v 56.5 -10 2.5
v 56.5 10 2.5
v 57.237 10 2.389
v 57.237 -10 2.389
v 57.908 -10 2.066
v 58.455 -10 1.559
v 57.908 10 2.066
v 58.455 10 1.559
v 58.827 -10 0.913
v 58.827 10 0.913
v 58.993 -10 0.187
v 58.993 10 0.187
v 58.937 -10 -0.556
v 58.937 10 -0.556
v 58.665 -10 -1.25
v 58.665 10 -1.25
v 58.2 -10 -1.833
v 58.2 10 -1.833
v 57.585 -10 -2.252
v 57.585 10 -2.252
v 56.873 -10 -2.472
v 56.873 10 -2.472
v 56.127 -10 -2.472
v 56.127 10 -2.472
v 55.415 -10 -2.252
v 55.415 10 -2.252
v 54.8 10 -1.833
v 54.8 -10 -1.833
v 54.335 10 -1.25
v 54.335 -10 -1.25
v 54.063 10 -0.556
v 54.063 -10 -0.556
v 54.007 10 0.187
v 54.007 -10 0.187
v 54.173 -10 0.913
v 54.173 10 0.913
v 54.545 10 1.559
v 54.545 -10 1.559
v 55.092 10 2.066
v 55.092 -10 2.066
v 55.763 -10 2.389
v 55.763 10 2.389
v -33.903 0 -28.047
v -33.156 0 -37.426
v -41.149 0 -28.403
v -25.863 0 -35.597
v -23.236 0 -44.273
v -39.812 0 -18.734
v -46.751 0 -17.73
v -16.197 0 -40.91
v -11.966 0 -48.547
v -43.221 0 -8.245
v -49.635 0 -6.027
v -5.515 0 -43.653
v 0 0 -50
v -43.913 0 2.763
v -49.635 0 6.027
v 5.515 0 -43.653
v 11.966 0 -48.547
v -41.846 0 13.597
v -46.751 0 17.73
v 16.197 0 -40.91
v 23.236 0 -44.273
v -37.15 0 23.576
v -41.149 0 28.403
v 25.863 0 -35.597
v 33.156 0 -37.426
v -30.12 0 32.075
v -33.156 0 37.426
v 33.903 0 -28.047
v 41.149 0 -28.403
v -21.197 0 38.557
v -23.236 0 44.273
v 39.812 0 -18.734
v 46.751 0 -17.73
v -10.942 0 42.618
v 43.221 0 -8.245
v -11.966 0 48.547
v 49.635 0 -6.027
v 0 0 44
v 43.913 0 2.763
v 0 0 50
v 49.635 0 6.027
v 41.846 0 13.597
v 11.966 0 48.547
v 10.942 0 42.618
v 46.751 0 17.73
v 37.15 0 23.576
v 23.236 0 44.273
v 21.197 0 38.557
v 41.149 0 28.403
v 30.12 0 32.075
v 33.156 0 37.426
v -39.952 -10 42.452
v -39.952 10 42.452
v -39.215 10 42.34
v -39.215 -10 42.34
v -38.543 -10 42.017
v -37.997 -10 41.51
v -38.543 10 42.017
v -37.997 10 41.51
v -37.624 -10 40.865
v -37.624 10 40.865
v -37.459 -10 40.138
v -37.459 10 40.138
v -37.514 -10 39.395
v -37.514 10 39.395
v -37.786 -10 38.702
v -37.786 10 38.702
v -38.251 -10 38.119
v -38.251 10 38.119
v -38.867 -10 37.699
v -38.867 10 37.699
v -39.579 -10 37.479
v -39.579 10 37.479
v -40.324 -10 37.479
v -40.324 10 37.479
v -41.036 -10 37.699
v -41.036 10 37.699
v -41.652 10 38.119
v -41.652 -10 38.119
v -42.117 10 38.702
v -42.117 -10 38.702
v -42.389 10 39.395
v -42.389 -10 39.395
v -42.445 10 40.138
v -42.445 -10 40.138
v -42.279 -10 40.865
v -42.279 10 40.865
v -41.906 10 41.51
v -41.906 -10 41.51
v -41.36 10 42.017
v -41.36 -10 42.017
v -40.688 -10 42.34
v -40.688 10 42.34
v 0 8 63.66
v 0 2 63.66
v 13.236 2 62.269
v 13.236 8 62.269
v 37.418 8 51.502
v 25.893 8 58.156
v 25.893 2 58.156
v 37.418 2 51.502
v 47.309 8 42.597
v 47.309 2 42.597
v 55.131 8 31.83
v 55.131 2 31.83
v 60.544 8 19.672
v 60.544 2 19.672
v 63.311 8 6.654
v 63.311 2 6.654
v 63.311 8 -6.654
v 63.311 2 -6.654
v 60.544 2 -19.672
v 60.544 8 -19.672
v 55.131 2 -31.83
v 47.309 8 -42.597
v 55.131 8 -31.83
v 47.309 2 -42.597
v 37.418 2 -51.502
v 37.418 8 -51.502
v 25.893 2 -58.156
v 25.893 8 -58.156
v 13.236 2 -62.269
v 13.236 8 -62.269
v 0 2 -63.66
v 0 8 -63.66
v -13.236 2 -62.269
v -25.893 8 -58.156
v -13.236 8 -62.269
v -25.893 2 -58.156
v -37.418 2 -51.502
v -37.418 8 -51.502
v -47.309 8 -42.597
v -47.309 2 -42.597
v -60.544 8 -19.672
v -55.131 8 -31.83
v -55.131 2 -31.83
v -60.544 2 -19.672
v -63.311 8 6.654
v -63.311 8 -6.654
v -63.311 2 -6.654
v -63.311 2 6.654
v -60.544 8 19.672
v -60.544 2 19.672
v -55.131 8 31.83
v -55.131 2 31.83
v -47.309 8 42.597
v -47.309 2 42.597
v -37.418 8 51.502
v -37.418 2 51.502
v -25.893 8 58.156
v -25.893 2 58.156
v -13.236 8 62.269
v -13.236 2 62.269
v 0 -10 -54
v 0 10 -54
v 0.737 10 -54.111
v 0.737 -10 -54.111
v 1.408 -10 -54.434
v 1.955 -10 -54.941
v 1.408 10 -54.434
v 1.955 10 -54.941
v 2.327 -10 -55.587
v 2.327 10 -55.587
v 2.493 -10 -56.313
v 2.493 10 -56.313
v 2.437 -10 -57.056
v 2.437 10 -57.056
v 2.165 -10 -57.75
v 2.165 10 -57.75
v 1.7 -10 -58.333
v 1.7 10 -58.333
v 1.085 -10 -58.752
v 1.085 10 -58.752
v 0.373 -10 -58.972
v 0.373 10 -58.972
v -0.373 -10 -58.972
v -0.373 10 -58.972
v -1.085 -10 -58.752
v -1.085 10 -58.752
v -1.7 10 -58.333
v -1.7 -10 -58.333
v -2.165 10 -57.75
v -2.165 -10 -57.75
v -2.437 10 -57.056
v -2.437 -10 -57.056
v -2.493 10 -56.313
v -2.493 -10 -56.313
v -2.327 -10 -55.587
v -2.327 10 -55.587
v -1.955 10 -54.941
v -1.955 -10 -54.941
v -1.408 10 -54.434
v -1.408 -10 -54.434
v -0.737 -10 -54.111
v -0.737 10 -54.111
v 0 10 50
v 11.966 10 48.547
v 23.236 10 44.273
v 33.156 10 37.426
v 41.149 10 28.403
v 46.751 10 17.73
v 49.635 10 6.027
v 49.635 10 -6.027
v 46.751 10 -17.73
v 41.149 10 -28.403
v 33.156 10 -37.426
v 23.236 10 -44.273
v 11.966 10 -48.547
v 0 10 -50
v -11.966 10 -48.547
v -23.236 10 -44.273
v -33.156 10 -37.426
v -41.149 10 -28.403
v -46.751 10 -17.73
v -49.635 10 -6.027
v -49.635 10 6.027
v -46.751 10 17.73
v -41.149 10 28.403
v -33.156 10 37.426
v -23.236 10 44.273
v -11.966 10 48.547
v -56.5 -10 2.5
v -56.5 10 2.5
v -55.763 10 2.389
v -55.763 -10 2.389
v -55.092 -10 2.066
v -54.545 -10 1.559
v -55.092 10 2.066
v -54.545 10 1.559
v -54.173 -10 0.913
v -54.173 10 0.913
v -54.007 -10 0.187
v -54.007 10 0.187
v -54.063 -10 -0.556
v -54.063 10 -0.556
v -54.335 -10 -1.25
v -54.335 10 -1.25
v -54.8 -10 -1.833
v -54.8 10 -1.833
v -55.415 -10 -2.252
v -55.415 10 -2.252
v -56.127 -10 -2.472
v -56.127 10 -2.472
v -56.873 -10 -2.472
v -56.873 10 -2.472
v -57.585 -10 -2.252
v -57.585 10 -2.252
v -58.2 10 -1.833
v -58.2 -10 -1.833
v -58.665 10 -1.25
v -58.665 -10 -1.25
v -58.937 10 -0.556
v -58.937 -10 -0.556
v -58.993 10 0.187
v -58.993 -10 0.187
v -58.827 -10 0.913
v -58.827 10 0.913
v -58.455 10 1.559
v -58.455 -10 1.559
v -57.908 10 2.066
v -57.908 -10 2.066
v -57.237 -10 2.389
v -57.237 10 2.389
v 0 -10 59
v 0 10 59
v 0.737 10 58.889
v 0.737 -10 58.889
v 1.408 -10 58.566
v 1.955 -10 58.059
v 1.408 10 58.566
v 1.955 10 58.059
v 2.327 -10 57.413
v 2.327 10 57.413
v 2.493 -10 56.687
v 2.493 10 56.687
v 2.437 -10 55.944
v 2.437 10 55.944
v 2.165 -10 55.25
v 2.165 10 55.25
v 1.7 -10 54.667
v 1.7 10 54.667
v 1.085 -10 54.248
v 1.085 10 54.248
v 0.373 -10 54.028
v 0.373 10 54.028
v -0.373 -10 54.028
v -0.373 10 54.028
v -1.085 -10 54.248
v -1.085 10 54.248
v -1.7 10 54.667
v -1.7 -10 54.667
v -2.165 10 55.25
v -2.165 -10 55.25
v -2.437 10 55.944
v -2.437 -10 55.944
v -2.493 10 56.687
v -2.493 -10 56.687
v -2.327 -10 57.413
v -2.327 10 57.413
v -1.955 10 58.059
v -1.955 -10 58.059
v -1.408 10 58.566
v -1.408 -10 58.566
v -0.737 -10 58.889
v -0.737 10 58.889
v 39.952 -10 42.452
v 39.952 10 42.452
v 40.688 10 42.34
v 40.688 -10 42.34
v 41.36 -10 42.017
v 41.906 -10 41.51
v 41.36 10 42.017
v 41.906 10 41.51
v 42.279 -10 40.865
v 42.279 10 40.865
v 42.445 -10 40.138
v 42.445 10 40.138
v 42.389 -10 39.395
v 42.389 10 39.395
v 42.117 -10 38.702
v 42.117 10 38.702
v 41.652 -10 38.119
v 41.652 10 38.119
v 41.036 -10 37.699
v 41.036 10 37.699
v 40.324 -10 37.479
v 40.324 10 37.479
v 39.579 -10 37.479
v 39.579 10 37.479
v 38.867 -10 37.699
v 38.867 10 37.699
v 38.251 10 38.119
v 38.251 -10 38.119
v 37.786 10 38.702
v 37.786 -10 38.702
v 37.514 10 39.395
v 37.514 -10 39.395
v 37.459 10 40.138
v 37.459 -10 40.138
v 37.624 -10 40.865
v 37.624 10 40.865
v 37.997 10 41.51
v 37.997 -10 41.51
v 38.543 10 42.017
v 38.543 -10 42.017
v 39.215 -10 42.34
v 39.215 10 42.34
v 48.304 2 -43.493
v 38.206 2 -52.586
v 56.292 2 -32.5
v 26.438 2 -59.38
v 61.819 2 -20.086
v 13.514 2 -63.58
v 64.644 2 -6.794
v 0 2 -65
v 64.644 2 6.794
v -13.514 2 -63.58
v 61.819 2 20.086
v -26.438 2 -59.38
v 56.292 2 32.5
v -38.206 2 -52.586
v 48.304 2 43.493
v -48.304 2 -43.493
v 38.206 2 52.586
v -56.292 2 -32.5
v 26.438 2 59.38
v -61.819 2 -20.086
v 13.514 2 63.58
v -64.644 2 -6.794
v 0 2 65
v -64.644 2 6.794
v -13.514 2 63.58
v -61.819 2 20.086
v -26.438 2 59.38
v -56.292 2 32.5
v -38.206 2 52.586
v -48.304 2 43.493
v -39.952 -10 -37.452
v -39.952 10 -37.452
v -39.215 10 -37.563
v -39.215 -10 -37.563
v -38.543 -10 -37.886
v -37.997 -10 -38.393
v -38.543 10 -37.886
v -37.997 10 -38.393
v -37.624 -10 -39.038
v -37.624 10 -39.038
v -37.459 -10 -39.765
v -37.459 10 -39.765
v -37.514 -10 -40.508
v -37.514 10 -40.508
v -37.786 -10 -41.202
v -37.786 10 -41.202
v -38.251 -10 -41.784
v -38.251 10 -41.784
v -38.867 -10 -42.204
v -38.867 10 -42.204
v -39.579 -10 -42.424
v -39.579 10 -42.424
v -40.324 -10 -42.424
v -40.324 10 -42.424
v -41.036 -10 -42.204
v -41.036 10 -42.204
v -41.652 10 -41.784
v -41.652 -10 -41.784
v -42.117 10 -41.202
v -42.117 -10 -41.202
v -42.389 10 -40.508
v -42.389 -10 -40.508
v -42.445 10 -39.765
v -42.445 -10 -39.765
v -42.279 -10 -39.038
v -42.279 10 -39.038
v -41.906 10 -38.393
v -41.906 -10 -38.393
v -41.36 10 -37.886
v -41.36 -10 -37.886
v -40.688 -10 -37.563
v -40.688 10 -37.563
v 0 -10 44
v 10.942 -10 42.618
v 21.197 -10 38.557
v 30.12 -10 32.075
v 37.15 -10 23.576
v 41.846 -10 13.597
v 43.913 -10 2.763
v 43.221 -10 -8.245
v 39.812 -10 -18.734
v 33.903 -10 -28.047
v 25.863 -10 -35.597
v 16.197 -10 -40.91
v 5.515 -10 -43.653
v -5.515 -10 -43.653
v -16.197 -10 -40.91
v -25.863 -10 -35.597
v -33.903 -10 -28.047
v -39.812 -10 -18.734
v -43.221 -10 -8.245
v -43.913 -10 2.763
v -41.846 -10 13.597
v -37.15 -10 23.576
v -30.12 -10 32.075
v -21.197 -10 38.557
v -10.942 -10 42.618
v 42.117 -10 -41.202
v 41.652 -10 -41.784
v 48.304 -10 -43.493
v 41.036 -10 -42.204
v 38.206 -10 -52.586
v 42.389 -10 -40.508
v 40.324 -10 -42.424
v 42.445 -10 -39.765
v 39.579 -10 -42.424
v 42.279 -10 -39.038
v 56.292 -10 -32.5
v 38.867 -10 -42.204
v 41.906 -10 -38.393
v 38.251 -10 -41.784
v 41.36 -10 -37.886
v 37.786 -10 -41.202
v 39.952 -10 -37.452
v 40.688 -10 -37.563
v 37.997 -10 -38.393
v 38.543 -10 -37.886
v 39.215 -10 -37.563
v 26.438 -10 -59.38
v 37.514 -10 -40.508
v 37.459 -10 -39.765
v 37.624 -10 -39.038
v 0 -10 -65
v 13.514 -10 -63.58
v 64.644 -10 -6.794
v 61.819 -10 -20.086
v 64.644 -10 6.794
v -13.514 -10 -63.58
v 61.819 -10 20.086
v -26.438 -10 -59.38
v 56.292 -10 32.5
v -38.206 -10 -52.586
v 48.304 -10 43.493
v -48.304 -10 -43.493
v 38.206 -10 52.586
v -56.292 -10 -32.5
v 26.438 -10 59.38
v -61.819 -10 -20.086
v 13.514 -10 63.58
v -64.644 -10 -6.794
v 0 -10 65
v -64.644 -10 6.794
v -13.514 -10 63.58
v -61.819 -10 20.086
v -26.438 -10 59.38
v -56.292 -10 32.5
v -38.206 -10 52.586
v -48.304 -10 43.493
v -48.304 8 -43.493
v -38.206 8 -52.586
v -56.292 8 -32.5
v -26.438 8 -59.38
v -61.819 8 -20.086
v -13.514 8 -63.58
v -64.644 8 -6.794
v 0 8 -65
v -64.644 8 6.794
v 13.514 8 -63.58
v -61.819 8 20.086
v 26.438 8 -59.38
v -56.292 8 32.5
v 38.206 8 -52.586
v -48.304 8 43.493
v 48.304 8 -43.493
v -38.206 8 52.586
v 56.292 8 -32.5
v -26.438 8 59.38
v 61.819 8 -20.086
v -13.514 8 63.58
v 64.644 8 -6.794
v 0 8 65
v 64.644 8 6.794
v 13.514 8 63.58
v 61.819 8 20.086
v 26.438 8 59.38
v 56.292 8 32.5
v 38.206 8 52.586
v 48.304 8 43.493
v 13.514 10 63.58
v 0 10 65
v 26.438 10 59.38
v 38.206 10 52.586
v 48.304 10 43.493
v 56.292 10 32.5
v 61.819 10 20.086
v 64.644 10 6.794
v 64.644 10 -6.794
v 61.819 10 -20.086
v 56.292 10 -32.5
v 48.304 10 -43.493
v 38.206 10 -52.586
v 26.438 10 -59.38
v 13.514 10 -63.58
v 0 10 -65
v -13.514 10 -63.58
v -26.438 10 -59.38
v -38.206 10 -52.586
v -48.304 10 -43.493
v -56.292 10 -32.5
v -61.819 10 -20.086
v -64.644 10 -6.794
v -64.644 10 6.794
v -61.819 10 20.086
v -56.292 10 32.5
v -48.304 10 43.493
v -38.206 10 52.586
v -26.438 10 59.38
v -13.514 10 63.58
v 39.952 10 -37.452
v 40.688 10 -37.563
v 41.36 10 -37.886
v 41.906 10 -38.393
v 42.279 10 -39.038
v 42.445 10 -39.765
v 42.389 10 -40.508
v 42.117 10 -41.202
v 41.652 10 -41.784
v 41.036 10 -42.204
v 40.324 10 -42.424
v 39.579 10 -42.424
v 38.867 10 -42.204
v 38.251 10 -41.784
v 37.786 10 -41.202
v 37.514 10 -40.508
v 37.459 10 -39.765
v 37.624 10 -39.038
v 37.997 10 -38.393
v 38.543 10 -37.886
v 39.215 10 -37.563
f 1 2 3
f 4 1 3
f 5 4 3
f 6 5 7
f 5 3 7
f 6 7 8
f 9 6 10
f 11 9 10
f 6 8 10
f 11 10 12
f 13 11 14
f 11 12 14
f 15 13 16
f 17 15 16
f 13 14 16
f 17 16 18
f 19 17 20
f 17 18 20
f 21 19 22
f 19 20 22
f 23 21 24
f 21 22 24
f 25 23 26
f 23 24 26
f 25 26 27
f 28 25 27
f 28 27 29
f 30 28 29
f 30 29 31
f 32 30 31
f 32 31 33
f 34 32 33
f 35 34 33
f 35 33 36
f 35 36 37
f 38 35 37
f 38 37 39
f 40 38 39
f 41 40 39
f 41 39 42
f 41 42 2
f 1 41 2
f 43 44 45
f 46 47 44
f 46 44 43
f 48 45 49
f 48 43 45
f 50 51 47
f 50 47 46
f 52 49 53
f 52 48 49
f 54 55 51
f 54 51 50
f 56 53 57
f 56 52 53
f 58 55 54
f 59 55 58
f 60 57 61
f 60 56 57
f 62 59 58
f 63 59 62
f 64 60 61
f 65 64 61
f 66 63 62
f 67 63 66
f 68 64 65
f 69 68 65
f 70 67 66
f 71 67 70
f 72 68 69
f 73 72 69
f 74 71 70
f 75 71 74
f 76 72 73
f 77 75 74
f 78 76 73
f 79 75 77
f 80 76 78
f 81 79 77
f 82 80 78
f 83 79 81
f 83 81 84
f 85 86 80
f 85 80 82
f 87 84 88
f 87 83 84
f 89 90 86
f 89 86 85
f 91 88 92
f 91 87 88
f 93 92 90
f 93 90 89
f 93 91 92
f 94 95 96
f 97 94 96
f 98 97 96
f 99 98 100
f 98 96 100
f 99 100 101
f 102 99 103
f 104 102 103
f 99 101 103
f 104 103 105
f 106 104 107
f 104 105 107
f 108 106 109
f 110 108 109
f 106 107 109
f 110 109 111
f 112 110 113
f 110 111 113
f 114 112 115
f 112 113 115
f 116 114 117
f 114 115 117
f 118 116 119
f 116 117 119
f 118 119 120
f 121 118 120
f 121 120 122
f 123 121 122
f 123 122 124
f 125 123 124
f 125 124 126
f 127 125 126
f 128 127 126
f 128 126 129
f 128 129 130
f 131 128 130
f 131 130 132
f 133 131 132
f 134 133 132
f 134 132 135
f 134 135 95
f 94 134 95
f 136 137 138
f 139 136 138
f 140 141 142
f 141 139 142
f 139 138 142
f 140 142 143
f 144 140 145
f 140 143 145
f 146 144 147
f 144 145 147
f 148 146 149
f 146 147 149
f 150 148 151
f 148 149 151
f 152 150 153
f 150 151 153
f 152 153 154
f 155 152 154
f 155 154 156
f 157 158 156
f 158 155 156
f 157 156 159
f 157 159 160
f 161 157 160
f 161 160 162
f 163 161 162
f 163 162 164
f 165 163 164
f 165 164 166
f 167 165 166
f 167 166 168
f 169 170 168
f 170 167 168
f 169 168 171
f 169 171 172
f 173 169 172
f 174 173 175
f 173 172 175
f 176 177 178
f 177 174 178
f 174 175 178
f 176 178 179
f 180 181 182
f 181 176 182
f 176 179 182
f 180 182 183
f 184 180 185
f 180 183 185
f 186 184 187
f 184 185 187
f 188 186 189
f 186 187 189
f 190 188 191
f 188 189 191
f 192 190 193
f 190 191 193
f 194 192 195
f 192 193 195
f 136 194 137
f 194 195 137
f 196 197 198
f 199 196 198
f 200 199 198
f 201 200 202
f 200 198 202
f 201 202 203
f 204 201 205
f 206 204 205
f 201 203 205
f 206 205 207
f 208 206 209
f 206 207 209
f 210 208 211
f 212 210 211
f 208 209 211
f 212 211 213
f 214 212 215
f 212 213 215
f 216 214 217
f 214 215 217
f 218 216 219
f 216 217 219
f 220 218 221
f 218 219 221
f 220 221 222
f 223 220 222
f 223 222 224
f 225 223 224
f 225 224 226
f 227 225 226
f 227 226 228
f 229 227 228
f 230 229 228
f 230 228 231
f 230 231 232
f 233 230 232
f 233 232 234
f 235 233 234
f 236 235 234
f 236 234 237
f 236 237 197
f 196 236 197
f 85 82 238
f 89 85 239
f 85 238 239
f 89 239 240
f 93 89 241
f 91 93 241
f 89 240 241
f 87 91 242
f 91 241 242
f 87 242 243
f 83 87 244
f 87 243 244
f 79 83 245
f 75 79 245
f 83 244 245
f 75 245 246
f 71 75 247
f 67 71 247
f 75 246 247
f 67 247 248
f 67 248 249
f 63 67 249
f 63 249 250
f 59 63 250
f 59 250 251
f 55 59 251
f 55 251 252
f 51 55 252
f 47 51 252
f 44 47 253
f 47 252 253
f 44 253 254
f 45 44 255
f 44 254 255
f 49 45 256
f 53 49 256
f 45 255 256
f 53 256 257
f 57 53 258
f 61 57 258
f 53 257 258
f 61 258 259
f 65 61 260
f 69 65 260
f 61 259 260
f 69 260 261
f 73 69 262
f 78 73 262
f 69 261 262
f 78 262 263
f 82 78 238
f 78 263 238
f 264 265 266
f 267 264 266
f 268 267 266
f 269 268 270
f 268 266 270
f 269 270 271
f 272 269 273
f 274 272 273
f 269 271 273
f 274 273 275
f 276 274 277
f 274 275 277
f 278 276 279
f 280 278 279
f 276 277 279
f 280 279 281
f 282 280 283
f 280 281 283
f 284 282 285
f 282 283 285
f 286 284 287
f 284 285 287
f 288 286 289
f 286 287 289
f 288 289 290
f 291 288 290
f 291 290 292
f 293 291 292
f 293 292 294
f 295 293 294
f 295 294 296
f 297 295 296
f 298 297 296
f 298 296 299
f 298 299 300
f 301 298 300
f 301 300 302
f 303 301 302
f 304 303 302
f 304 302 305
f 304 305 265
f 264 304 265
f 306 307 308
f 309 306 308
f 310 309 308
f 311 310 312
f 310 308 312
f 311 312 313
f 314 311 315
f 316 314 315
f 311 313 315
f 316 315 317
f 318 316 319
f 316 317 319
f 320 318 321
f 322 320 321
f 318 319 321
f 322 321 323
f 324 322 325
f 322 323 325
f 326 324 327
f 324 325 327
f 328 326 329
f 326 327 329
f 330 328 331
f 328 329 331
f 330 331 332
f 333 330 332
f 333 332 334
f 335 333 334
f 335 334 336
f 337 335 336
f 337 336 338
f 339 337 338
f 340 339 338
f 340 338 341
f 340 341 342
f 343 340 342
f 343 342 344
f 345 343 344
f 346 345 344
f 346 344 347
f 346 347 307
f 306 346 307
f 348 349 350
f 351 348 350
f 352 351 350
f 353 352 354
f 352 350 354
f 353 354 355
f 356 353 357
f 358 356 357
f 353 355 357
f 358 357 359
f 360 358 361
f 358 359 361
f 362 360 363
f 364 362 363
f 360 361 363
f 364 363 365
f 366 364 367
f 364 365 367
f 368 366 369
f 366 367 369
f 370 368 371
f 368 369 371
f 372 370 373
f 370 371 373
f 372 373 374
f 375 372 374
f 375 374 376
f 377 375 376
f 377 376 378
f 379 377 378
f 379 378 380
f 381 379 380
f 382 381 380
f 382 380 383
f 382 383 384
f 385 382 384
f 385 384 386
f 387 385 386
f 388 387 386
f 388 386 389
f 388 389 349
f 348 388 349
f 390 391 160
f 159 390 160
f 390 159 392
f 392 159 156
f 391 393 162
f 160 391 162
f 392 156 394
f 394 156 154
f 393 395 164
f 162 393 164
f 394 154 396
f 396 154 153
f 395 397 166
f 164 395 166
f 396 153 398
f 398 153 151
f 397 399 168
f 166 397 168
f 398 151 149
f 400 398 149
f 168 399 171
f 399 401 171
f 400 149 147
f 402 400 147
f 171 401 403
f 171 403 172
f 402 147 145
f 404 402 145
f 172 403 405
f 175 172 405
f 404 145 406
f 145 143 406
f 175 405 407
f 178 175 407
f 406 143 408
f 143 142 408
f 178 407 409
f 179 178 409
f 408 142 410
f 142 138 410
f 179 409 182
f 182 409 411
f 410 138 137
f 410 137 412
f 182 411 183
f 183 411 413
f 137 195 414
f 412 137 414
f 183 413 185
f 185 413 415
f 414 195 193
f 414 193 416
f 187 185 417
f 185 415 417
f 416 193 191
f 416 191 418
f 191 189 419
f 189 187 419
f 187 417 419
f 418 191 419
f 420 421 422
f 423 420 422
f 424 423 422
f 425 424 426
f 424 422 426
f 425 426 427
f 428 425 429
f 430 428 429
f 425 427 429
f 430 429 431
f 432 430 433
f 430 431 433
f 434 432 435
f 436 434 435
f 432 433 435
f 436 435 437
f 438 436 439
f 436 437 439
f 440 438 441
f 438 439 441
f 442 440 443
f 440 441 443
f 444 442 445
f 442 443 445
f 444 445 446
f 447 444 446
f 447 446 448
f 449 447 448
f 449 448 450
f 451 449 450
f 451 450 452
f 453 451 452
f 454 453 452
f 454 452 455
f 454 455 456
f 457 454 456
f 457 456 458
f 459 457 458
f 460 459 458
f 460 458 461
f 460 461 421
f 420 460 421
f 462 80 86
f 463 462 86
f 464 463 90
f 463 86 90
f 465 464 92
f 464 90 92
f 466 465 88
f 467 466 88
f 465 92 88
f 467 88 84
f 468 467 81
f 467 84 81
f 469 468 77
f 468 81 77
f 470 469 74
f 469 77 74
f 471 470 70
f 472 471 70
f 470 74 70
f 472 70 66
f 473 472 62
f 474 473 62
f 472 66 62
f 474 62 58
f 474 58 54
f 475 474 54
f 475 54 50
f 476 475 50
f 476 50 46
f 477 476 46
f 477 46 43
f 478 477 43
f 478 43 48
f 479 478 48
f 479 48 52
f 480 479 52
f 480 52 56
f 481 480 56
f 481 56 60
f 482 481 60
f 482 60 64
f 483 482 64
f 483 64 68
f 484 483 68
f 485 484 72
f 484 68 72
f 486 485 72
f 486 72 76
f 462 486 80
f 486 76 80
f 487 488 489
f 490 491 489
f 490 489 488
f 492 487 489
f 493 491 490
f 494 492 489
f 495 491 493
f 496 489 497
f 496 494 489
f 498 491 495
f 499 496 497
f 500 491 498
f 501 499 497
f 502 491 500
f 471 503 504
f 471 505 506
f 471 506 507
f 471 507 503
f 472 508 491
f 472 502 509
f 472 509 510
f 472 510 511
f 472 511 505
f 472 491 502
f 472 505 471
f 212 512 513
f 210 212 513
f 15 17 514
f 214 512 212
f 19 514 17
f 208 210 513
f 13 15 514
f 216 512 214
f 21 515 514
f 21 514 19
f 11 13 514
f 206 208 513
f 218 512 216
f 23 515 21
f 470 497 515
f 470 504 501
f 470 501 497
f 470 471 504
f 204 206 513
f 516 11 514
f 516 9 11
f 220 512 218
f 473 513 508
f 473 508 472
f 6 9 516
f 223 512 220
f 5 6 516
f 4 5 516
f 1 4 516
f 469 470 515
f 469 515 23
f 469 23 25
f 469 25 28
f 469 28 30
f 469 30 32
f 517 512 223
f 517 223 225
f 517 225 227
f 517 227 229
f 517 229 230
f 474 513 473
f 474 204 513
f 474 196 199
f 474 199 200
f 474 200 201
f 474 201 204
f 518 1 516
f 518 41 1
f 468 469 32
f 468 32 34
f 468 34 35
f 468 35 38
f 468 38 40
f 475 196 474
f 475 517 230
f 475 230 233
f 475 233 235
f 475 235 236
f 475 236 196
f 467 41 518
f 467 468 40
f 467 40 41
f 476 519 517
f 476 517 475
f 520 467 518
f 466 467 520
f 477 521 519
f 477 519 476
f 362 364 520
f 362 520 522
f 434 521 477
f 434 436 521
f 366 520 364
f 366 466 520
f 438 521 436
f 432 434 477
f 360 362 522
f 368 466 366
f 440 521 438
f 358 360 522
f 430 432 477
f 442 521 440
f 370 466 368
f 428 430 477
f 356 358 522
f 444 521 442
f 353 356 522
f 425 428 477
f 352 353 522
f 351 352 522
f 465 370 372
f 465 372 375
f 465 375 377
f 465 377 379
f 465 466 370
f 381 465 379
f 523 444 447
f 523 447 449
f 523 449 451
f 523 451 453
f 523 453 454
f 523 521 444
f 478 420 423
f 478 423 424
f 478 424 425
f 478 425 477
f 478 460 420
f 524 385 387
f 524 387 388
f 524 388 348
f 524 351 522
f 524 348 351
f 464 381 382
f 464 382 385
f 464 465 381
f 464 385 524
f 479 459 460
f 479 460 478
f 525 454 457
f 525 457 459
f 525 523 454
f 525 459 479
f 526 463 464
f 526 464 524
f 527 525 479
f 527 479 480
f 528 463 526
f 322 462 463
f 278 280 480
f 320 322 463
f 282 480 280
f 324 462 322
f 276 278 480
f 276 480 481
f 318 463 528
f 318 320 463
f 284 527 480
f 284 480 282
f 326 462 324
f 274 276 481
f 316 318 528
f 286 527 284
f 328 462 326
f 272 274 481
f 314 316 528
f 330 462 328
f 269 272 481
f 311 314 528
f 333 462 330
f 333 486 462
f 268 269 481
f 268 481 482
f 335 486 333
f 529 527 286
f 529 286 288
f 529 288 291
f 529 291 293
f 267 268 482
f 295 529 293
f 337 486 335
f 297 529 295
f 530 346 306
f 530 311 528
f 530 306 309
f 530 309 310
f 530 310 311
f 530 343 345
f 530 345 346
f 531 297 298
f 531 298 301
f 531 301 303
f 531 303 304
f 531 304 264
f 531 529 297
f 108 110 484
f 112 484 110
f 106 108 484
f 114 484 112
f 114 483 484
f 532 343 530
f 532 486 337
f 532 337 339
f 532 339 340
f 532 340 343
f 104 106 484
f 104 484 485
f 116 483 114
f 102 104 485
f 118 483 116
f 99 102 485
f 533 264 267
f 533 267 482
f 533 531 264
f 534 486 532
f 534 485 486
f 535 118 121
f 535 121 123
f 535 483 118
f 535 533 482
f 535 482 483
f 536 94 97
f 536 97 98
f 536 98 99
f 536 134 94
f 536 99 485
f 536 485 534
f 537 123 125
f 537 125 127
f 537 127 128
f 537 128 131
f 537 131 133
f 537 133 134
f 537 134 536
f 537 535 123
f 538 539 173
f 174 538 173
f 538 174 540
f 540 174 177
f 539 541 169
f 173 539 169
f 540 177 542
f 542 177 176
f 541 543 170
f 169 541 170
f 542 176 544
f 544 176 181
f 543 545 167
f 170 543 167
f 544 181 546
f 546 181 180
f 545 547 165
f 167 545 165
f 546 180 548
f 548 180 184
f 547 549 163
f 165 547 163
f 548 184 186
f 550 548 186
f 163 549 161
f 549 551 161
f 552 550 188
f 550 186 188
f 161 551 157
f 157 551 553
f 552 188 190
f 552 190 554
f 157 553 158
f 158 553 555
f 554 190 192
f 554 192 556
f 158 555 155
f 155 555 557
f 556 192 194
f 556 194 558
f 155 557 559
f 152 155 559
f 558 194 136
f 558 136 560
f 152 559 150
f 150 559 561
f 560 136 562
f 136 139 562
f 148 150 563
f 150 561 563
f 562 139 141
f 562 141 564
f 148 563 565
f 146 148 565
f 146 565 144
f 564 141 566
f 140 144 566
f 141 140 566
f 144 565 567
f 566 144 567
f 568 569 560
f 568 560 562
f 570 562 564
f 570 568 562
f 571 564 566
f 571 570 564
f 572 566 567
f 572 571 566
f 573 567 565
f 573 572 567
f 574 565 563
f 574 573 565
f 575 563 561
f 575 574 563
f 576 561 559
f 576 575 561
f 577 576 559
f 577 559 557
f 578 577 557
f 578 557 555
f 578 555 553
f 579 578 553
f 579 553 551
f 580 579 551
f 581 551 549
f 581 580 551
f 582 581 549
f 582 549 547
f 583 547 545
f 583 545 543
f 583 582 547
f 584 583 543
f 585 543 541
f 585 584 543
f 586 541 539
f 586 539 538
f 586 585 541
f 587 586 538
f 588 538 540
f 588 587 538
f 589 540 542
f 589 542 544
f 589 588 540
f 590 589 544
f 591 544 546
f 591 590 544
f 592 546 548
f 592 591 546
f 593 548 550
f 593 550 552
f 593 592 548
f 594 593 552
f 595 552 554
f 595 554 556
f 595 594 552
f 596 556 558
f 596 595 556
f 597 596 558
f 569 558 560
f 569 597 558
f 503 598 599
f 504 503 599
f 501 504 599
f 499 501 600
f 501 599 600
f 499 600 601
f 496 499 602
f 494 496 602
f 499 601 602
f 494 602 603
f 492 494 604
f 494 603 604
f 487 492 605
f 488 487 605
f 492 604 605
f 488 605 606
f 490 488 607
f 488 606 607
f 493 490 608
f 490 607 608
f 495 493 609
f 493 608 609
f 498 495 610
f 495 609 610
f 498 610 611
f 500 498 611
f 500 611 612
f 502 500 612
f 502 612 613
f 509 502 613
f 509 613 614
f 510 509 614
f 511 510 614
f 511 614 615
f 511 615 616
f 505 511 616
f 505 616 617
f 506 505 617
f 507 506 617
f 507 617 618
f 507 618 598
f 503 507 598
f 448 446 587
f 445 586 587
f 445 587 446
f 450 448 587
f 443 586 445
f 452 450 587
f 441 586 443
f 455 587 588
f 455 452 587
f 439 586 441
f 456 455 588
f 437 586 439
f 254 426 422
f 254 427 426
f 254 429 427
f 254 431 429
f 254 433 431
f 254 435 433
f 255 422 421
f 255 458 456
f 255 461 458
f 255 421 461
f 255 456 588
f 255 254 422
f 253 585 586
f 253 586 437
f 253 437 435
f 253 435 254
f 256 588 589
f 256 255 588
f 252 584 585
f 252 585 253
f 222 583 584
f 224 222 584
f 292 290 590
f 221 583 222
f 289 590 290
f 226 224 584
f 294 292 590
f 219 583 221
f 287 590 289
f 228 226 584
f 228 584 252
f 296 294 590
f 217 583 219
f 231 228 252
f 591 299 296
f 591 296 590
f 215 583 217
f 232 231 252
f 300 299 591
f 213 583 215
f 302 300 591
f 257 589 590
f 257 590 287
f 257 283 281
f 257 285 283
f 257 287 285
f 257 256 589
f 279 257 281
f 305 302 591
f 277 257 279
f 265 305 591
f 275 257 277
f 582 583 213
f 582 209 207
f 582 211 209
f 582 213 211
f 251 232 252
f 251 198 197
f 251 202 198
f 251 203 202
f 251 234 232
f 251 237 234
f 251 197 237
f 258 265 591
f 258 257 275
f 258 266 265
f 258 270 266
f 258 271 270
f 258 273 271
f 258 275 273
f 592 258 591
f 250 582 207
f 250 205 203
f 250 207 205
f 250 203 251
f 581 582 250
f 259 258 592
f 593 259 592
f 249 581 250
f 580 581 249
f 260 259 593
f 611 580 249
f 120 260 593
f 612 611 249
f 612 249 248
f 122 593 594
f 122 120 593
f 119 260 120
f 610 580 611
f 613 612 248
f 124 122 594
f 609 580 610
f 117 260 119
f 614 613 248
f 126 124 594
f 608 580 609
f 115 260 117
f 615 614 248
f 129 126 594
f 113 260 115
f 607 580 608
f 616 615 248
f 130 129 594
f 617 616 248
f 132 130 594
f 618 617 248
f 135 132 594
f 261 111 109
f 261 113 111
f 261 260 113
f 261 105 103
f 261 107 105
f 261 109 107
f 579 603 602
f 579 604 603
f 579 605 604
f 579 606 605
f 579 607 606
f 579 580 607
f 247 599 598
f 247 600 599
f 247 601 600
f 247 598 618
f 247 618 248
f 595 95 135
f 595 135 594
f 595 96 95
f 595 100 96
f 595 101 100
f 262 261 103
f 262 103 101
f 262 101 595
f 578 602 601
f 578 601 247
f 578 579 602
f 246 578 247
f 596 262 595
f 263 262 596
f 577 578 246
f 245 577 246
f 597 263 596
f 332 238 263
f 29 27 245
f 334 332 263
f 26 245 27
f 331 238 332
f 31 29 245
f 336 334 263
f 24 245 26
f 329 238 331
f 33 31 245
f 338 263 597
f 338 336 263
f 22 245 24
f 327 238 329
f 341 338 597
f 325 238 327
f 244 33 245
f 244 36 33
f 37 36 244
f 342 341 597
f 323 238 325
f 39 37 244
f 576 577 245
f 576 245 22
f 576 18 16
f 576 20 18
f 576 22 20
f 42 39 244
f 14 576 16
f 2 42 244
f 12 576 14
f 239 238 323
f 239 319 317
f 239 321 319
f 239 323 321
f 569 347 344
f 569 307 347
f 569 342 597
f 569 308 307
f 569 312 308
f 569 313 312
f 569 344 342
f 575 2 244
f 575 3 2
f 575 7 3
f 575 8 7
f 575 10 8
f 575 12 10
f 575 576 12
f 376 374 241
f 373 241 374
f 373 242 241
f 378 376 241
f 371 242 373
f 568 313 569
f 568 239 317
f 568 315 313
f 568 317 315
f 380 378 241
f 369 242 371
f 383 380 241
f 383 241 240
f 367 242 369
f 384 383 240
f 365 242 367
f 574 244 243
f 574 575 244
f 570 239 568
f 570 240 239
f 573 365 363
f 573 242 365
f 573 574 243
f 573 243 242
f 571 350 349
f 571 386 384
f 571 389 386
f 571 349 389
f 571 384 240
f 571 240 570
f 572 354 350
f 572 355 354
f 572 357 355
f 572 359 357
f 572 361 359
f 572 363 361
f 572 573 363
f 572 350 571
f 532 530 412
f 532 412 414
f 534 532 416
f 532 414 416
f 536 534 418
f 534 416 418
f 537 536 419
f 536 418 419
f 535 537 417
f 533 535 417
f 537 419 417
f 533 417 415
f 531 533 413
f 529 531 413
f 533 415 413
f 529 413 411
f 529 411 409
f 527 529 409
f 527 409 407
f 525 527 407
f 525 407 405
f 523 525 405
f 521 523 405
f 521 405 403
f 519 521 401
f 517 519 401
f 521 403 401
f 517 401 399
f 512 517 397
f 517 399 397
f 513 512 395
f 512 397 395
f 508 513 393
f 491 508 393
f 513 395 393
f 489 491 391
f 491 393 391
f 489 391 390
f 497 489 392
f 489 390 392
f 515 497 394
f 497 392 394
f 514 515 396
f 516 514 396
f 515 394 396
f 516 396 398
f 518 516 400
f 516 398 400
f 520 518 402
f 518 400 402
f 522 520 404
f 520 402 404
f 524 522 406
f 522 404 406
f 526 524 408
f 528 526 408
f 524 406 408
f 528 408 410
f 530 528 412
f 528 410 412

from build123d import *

# Parameters (mm, degrees)
SKETCH1_R                = 63.66
BOSS_EXTRUDE1_DEPTH      = 10
SKETCH2_R                = 65
BOSS_EXTRUDE2_DEPTH      = 2
BOSS_EXTRUDE3_DEPTH      = 10
BOSS_EXTRUDE3_DEPTH_BACK = 2
SKETCH3_R                = 65
SKETCH4_R                = 2.5
SKETCH4_R_2              = 44
CUT_EXTRUDE1_DEPTH       = 95.074438611
SKETCH5_R                = 50
CUT_EXTRUDE2_DEPTH       = 10


with BuildPart() as part:
    # Sketch1 → Boss-Extrude1 (new body)
    with BuildSketch(Plane(origin=(0, 0, 0), x_dir=(1, 0, 0), z_dir=(0, 1, 0))):
        with Locations(Location((0, 0, 0), (0, 0, 270))):
            Circle(SKETCH1_R)
    extrude(amount=BOSS_EXTRUDE1_DEPTH)

    # Sketch2 → Boss-Extrude2 (add)
    with BuildSketch(Plane(origin=(0, 10, 0), x_dir=(1, 0, 0), z_dir=(0, 1, 0))):
        with Locations(Location((0, 0, 0), (0, 0, 270))):
            Circle(SKETCH2_R)
    extrude(amount=-BOSS_EXTRUDE2_DEPTH)

    # Sketch3 → Boss-Extrude3 (add, two sides: drawn at the far end of the back side and taken through both)
    with BuildSketch(Plane.XZ.offset(-BOSS_EXTRUDE3_DEPTH_BACK)):
        with Locations(Location((0, 0, 0), (0, 0, 90))):
            Circle(SKETCH3_R)
    extrude(amount=BOSS_EXTRUDE3_DEPTH + BOSS_EXTRUDE3_DEPTH_BACK)

    # Sketch4 → Cut-Extrude1 (cut, through all)
    with BuildSketch(Plane(origin=(0, 10, 0), x_dir=(1, 0, 0), z_dir=(0, 1, 0))):
        with Locations(Location((0, 56.5, 0), (0, 0, 270))):
            Circle(SKETCH4_R)
        with Locations(Location((39.951533137, 39.951533137, 0), (0, 0, 270))):
            Circle(SKETCH4_R)
        with Locations(Location((56.5, 0, 0), (0, 0, 270))):
            Circle(SKETCH4_R)
        with Locations(Location((39.951533137, -39.951533137, 0), (0, 0, 270))):
            Circle(SKETCH4_R)
        with Locations(Location((0, -56.5, 0), (0, 0, 270))):
            Circle(SKETCH4_R)
        with Locations(Location((-39.951533137, -39.951533137, 0), (0, 0, 270))):
            Circle(SKETCH4_R)
        with Locations(Location((-56.5, 0, 0), (0, 0, 270))):
            Circle(SKETCH4_R)
        with Locations(Location((-39.951533137, 39.951533137, 0), (0, 0, 270))):
            Circle(SKETCH4_R)
        with Locations(Location((0, 0, 0), (0, 0, 270))):
            Circle(SKETCH4_R_2)
    extrude(amount=-CUT_EXTRUDE1_DEPTH, mode=Mode.SUBTRACT)

    # Sketch5 → Cut-Extrude2 (cut)
    with BuildSketch(Plane(origin=(0, 10, 0), x_dir=(1, 0, 0), z_dir=(0, 1, 0))):
        with Locations(Location((0, 0, 0), (0, 0, 270))):
            Circle(SKETCH5_R)
    extrude(amount=-CUT_EXTRUDE2_DEPTH, mode=Mode.SUBTRACT)


solid = part.part
